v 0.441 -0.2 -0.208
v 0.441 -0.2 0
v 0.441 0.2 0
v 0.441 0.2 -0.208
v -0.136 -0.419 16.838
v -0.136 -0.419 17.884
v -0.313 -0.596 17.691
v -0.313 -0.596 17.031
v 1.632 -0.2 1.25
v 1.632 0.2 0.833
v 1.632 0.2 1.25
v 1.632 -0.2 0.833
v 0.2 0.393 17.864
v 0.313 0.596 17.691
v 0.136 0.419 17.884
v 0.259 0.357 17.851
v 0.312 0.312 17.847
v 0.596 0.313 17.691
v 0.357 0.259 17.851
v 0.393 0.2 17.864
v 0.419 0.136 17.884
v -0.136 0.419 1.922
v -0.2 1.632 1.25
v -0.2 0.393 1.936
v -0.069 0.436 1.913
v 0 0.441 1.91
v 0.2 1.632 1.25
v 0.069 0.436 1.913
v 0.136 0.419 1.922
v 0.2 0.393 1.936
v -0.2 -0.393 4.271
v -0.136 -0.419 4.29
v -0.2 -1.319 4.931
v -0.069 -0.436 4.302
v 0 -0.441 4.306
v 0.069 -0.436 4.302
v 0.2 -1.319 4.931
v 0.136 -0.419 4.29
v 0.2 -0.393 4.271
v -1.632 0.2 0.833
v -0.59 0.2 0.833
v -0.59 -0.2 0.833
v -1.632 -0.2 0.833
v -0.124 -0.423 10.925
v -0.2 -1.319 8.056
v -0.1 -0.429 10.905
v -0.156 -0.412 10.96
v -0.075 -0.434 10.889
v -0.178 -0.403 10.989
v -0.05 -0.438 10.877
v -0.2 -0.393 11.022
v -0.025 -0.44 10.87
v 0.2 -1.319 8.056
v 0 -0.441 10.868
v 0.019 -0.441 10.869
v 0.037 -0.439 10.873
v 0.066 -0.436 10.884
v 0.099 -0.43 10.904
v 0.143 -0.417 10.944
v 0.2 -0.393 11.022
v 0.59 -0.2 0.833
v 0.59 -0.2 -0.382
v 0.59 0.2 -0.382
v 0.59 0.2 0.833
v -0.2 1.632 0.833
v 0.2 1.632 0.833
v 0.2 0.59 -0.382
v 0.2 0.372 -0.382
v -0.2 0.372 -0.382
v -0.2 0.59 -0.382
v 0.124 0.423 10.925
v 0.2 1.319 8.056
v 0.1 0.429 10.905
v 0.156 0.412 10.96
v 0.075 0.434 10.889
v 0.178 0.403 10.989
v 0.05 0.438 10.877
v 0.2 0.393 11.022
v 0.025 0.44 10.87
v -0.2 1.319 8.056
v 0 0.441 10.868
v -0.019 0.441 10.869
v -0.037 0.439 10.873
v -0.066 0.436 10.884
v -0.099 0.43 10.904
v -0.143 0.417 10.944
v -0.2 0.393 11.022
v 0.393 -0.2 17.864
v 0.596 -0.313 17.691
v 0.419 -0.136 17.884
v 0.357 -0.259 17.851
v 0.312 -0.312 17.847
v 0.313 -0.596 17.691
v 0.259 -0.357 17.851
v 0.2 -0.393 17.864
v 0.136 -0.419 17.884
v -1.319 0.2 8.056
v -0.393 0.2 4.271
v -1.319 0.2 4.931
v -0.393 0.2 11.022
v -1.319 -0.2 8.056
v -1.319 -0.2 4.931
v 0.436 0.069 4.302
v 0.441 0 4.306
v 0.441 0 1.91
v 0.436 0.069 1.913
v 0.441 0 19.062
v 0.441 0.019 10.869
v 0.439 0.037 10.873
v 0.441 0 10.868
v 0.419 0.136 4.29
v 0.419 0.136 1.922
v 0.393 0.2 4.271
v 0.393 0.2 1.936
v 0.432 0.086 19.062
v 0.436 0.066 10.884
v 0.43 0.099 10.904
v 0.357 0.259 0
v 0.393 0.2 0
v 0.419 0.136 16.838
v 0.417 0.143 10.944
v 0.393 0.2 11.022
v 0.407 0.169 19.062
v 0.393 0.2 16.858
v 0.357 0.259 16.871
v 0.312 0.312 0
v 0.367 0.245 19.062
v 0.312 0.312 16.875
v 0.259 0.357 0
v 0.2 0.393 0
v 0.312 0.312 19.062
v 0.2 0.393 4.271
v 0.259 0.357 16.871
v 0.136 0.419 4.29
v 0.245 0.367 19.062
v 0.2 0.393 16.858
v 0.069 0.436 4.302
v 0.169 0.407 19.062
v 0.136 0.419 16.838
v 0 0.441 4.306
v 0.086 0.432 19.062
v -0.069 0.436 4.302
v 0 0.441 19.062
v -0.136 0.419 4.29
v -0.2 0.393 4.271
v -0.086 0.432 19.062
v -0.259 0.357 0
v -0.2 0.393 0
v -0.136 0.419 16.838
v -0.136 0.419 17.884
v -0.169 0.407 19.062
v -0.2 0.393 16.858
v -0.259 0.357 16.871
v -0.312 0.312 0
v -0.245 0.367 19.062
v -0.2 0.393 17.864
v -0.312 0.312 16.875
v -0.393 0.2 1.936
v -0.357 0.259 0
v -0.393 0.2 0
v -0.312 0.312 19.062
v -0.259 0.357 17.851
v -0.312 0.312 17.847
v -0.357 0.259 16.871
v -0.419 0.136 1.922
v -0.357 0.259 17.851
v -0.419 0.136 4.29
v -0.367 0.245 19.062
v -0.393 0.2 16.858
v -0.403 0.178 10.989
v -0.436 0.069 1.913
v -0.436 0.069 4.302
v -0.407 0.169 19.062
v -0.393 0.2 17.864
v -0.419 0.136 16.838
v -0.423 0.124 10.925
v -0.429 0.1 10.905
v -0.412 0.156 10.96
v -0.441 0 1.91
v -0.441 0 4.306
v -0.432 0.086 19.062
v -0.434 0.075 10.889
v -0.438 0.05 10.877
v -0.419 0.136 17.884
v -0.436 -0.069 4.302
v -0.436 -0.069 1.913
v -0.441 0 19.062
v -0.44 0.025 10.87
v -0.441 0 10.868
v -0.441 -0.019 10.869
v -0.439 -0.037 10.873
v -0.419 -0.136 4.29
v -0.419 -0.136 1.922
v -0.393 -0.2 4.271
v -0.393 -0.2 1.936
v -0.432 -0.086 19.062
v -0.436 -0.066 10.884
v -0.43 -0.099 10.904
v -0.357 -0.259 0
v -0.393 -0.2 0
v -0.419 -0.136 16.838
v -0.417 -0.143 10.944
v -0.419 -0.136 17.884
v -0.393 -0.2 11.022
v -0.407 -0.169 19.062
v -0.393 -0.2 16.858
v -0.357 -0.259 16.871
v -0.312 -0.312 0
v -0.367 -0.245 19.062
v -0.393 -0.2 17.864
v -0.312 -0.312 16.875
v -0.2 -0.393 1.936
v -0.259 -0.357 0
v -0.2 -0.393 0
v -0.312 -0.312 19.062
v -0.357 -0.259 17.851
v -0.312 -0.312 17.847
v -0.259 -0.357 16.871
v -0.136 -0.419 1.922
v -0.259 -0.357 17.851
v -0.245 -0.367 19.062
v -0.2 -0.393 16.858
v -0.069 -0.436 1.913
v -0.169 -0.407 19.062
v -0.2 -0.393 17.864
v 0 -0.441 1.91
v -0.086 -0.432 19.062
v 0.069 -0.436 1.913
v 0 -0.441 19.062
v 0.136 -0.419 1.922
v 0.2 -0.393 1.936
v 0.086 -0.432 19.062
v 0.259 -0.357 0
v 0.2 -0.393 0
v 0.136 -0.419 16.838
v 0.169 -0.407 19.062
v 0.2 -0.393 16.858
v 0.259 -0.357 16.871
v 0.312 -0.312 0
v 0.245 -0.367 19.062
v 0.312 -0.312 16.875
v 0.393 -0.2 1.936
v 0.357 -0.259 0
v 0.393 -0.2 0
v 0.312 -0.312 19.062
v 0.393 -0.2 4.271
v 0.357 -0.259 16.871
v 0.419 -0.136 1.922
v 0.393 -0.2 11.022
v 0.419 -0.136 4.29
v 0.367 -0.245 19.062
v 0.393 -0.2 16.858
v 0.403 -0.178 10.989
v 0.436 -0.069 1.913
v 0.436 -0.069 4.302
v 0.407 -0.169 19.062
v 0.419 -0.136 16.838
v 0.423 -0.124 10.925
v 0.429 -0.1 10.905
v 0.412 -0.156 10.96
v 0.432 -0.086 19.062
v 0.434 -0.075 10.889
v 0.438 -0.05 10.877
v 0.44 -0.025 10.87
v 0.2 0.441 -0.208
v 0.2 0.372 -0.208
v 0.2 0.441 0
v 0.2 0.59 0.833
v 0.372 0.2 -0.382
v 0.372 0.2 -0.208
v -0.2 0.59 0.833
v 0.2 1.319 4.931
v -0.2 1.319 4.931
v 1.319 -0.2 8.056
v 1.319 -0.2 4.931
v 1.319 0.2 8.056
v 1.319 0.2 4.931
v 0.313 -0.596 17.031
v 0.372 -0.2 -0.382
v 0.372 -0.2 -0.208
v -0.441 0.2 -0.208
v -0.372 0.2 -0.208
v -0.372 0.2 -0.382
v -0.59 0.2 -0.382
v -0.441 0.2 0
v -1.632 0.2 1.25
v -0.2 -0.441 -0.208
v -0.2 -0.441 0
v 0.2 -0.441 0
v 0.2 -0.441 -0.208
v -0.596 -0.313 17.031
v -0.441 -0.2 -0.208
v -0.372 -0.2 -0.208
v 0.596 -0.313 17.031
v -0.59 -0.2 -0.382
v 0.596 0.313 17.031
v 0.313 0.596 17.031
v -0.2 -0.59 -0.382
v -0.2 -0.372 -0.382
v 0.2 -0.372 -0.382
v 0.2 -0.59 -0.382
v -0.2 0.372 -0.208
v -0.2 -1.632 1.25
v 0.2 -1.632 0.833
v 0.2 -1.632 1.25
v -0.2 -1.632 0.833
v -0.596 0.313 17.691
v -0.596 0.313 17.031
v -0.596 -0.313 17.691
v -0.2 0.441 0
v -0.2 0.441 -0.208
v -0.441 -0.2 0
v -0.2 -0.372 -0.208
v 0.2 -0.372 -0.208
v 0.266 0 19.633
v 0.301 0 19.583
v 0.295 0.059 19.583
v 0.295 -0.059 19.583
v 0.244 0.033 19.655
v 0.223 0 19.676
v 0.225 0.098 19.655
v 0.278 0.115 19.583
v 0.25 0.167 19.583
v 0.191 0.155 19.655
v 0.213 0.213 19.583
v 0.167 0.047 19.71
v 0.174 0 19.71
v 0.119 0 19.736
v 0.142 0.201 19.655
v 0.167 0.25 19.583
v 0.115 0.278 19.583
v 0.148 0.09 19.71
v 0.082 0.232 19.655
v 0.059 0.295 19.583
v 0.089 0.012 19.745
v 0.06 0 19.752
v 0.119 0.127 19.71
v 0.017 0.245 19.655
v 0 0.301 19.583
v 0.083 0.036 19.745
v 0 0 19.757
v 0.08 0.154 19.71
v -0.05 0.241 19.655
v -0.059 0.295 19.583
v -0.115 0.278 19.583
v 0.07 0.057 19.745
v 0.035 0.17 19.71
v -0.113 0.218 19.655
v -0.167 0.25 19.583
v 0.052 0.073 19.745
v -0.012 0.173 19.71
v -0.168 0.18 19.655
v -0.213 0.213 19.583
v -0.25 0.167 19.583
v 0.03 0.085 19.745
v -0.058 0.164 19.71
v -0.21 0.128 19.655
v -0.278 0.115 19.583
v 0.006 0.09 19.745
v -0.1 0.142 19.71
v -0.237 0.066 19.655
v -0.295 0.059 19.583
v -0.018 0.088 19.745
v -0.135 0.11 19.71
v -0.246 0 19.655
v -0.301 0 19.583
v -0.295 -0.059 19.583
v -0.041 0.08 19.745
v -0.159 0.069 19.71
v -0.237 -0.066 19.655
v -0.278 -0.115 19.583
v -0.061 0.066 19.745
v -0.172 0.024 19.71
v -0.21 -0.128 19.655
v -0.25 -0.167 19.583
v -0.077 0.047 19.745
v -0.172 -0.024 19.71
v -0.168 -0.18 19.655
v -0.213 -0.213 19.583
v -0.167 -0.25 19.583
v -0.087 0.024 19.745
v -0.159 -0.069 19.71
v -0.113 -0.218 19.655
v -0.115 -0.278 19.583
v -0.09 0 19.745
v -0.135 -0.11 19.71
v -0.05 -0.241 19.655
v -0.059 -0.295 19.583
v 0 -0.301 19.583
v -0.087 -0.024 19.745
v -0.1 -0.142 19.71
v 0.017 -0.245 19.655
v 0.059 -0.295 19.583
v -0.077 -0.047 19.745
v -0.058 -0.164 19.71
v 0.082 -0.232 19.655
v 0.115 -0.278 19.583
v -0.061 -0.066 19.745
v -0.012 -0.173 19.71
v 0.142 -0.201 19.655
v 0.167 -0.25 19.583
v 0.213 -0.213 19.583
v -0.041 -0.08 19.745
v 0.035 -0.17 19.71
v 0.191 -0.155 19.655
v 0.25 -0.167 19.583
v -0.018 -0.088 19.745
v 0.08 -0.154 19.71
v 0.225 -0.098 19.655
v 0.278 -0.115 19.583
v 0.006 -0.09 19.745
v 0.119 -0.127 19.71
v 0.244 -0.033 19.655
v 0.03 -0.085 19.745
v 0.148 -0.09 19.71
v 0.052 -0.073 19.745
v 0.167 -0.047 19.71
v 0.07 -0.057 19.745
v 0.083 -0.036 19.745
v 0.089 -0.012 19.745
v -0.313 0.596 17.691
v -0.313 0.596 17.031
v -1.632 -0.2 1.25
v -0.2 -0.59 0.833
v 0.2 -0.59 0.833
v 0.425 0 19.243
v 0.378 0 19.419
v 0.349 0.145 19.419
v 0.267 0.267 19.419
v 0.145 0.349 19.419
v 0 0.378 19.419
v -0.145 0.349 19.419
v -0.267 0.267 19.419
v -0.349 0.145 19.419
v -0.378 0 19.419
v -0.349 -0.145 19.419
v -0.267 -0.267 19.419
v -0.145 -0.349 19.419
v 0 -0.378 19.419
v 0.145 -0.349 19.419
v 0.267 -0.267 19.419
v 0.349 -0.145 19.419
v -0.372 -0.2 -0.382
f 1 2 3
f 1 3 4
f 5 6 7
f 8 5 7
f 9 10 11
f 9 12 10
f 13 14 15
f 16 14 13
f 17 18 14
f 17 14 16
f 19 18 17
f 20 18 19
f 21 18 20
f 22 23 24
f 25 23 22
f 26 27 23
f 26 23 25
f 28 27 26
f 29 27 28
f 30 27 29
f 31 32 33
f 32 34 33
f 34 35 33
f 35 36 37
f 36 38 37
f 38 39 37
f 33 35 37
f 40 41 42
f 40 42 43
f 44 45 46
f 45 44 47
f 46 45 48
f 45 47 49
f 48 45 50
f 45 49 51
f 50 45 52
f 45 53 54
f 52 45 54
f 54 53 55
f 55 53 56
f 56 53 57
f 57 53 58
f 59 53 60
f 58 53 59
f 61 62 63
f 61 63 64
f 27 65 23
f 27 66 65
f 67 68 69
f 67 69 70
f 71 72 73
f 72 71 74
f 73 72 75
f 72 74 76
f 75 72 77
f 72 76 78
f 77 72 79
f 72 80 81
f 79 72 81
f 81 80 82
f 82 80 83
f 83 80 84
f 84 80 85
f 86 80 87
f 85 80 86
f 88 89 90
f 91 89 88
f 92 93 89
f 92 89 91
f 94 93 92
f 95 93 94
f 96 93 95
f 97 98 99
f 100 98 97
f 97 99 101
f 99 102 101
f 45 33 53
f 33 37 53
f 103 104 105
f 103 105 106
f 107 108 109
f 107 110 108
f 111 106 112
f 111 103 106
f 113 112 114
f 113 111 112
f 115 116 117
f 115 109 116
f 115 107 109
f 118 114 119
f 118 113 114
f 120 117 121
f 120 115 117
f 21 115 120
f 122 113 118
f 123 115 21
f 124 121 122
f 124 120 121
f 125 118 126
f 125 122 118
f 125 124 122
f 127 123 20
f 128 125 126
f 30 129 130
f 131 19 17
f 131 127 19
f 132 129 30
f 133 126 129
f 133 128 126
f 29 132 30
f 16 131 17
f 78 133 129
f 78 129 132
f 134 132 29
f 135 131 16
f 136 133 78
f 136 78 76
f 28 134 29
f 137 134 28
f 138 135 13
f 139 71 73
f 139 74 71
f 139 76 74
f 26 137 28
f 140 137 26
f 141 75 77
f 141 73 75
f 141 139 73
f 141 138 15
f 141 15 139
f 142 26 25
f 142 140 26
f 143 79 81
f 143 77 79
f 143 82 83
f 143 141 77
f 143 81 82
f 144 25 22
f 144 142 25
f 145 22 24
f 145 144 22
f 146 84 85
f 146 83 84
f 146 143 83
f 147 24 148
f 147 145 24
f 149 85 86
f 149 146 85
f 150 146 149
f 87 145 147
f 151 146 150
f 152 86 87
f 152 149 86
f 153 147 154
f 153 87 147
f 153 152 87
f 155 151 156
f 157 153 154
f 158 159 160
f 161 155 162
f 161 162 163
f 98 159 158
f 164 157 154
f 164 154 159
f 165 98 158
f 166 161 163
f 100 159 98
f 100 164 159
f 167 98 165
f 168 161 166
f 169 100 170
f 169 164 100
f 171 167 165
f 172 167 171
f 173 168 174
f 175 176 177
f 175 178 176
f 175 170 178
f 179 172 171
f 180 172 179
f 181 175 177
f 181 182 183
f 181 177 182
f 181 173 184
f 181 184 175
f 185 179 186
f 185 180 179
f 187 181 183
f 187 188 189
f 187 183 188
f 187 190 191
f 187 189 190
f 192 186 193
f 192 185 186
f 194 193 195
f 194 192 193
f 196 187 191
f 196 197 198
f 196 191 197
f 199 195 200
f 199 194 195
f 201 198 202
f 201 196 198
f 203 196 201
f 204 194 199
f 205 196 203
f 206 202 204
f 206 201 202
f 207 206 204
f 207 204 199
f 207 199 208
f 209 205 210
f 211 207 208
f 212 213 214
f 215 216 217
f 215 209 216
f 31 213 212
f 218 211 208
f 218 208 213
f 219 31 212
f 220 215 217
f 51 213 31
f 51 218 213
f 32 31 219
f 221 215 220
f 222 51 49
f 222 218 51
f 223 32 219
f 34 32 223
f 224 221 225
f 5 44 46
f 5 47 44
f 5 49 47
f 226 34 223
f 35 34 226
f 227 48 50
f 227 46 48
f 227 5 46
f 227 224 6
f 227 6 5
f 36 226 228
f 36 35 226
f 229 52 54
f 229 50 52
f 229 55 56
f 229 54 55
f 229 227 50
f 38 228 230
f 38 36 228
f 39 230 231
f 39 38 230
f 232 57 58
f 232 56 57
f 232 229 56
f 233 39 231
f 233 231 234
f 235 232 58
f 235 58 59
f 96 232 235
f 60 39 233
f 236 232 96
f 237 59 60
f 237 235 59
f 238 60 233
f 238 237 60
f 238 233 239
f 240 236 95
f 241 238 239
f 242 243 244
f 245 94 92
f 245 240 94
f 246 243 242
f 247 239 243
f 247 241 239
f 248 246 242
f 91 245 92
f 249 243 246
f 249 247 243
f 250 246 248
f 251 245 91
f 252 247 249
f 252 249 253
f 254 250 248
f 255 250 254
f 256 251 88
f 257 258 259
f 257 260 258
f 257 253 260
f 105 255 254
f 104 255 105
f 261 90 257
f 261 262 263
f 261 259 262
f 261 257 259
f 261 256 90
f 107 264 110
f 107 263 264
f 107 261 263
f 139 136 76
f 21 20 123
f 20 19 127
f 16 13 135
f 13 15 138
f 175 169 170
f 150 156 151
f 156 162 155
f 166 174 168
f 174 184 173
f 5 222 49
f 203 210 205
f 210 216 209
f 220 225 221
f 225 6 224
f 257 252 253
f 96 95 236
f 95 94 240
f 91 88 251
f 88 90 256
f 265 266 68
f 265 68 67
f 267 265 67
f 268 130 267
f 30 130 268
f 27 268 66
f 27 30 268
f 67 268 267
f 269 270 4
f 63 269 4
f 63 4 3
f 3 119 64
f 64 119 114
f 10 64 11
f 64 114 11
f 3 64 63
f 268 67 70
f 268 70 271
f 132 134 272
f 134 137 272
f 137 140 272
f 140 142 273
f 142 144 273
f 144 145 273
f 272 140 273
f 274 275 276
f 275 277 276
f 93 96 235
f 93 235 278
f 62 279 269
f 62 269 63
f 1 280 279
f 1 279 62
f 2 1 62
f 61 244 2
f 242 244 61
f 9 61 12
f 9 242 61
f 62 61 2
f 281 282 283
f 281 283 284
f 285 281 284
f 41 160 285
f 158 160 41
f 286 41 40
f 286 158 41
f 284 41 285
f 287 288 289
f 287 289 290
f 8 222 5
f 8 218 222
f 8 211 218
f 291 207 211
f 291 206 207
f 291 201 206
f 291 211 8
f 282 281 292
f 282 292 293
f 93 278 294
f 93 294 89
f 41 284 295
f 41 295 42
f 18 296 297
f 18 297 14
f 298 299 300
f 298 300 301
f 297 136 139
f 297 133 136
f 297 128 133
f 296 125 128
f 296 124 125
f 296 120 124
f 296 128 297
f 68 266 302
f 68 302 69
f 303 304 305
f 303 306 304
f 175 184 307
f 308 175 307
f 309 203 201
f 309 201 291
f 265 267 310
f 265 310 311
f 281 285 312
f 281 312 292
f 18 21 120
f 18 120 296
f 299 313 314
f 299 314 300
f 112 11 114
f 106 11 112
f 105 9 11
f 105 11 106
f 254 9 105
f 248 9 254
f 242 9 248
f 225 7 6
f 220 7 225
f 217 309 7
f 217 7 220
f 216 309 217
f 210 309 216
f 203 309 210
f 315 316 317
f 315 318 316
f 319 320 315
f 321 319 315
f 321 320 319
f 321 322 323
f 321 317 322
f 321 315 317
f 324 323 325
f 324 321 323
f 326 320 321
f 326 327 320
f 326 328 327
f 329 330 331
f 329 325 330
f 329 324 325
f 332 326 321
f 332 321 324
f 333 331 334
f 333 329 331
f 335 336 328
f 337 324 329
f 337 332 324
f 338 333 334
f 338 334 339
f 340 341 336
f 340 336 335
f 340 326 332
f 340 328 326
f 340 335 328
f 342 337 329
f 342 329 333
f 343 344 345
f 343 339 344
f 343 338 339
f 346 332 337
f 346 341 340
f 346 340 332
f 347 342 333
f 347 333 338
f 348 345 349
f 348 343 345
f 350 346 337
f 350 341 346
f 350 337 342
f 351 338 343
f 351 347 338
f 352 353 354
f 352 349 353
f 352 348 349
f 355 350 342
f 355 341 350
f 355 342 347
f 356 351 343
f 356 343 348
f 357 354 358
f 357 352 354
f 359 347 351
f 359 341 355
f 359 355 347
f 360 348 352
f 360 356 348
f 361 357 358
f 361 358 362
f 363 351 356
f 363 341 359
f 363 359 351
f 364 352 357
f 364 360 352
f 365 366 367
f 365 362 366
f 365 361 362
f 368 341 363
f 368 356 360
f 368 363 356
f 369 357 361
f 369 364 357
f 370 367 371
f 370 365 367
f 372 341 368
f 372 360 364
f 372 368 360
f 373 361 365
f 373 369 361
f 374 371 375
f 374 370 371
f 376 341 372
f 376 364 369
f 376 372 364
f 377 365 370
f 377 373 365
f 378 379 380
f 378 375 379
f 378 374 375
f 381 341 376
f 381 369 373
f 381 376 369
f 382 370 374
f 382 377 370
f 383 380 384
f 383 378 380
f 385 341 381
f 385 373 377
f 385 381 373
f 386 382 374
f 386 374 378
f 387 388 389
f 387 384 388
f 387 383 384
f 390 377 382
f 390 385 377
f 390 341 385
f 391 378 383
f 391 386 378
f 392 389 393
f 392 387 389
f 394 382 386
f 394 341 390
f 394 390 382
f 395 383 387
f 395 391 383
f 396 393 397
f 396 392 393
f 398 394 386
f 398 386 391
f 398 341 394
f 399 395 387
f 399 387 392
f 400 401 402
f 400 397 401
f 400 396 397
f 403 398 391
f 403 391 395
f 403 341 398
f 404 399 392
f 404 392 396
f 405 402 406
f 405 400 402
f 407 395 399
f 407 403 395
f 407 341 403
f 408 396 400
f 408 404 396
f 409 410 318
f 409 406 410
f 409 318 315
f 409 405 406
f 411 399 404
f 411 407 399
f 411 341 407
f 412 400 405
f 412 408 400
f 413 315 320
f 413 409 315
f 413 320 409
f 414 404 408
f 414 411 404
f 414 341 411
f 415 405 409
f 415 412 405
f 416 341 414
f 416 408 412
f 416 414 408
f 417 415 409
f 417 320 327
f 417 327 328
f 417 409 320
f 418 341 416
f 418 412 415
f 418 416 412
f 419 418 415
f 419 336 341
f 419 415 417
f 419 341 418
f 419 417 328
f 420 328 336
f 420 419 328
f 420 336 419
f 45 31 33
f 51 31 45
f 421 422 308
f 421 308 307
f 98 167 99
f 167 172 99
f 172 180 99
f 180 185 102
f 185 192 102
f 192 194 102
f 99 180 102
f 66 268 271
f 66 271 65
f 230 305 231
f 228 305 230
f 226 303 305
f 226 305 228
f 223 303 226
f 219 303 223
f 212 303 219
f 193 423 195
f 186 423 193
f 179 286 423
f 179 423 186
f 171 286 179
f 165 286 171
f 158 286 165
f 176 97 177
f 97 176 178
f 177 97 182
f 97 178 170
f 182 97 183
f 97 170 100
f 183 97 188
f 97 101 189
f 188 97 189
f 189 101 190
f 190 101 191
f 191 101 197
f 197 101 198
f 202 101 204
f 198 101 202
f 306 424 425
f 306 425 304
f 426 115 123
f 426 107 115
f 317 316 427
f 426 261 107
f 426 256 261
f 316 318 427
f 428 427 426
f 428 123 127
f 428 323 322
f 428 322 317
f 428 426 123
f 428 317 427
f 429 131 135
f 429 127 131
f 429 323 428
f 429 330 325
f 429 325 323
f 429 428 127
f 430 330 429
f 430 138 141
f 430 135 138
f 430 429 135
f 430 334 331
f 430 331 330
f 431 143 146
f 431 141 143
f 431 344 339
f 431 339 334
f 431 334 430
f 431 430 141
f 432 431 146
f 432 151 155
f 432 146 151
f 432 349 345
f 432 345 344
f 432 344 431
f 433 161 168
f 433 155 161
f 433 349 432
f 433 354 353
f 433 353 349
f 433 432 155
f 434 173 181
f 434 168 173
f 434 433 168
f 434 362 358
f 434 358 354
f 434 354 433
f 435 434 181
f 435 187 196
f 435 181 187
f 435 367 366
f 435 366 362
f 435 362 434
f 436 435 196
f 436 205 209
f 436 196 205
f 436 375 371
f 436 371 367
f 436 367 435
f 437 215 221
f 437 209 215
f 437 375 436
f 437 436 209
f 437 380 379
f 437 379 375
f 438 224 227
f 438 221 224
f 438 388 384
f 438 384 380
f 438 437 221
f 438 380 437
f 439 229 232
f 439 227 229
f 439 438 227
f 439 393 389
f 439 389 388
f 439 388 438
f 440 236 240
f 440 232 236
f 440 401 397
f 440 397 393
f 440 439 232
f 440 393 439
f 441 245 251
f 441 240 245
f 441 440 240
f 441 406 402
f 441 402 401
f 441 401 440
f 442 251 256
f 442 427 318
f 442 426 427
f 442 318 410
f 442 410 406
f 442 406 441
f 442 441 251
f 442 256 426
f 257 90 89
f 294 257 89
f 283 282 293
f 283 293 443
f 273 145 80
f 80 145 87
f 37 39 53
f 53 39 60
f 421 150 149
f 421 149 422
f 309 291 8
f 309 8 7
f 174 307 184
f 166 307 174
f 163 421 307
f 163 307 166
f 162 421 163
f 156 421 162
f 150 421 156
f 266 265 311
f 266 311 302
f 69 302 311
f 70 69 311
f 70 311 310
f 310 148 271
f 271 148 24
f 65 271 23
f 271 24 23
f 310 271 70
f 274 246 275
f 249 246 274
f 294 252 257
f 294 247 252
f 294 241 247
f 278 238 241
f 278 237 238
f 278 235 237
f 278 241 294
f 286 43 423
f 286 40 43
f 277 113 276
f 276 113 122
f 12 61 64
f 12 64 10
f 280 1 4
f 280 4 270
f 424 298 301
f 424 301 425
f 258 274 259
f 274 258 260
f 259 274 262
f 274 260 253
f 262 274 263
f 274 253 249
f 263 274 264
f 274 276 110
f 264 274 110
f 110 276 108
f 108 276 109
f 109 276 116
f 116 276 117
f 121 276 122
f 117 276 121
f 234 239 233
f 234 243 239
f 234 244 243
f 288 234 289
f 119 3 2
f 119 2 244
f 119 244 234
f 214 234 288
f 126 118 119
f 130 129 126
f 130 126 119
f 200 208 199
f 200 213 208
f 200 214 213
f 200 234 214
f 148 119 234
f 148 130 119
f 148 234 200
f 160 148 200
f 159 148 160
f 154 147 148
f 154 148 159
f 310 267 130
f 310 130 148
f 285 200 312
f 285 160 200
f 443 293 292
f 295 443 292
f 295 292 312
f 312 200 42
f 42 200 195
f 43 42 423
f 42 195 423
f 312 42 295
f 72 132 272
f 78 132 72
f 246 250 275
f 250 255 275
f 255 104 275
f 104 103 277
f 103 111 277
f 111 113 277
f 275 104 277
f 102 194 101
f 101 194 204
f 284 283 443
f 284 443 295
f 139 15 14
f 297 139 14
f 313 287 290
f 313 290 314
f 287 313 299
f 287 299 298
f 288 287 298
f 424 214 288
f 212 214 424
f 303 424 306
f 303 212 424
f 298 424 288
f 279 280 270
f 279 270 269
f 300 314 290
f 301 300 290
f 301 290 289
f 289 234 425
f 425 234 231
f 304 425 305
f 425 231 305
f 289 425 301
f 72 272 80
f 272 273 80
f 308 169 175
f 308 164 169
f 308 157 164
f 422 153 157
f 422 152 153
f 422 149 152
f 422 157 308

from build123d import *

# Parameters (mm, degrees)
F3_DEPTH = 0.2
F6_DEPTH = 0.2
F7_COUNT = 4


# Not quite as in the source:
# - a feature names something its author has since deleted; it is built from what else it names


with BuildPart() as f1:
    # F0 (on Front) → F1 (revolve)
    with BuildSketch(Plane.XZ):
        with BuildLine():
            Line((0, 19.7569444444), (0, 0))
            Line((0, 0), (0.4409722222, 0))
            Line((0.4409722222, 0), (0.4409722222, 19.0625))
            ThreePointArc((0.4409722222, 19.0625), (0.4053949582, 19.3321442616), (0.3010981711, 19.5833333333))
            ThreePointArc((0.3010981711, 19.5833333333), (0.1737821384, 19.7104325641), (0, 19.7569444444))
        make_face()
    revolve(axis=Axis((0, 0, 9.8784722222), (0, 0, 1)))

    # F2 (on Front) → F3 (join, symmetric)
    with BuildSketch(Plane.XZ):
        Polygon((0, 12.279863856), (0, 3.9918203777), (1.3194444444, 4.9305555556), (1.3194444444, 8.0555555556), align=None)
        Polygon((0, 2.1539925494), (0, 0), (0.4409722222, 0), (0.4409722222, -0.2083333333), (0.3715277778, -0.2083333333), (0.3715277778, -0.3819444444), (0.5902777778, -0.3819444444), (0.5902777778, 0.8333333333), (1.6319444444, 0.8333333333), (1.6319444444, 1.25), align=None)
    extrude(amount=F3_DEPTH, both=True)

    # F5 (on face) → F6 (join, symmetric)
    with BuildSketch(Plane(origin=(0, 0, 0), x_dir=(0.7071067812, -0.7071067812, 0), z_dir=(-0.7071067812, -0.7071067812, 0))):
        Polygon((0, 16.5328663793), (0.6423611111, 17.03125), (0.6423611111, 17.6909722222), (0, 18.1893558429), align=None)
    extrude(amount=F6_DEPTH, both=True)

    # F7: F1 ×4 about axis
    f7_axis = Axis((0, 0, 0), (0, 0, 1))


with BuildPart() as f1_1:
    add(f1.part)
    for i in range(1, F7_COUNT):
        add(f1.part.rotate(f7_axis, i * 360 / F7_COUNT))


solid = f1_1.part
